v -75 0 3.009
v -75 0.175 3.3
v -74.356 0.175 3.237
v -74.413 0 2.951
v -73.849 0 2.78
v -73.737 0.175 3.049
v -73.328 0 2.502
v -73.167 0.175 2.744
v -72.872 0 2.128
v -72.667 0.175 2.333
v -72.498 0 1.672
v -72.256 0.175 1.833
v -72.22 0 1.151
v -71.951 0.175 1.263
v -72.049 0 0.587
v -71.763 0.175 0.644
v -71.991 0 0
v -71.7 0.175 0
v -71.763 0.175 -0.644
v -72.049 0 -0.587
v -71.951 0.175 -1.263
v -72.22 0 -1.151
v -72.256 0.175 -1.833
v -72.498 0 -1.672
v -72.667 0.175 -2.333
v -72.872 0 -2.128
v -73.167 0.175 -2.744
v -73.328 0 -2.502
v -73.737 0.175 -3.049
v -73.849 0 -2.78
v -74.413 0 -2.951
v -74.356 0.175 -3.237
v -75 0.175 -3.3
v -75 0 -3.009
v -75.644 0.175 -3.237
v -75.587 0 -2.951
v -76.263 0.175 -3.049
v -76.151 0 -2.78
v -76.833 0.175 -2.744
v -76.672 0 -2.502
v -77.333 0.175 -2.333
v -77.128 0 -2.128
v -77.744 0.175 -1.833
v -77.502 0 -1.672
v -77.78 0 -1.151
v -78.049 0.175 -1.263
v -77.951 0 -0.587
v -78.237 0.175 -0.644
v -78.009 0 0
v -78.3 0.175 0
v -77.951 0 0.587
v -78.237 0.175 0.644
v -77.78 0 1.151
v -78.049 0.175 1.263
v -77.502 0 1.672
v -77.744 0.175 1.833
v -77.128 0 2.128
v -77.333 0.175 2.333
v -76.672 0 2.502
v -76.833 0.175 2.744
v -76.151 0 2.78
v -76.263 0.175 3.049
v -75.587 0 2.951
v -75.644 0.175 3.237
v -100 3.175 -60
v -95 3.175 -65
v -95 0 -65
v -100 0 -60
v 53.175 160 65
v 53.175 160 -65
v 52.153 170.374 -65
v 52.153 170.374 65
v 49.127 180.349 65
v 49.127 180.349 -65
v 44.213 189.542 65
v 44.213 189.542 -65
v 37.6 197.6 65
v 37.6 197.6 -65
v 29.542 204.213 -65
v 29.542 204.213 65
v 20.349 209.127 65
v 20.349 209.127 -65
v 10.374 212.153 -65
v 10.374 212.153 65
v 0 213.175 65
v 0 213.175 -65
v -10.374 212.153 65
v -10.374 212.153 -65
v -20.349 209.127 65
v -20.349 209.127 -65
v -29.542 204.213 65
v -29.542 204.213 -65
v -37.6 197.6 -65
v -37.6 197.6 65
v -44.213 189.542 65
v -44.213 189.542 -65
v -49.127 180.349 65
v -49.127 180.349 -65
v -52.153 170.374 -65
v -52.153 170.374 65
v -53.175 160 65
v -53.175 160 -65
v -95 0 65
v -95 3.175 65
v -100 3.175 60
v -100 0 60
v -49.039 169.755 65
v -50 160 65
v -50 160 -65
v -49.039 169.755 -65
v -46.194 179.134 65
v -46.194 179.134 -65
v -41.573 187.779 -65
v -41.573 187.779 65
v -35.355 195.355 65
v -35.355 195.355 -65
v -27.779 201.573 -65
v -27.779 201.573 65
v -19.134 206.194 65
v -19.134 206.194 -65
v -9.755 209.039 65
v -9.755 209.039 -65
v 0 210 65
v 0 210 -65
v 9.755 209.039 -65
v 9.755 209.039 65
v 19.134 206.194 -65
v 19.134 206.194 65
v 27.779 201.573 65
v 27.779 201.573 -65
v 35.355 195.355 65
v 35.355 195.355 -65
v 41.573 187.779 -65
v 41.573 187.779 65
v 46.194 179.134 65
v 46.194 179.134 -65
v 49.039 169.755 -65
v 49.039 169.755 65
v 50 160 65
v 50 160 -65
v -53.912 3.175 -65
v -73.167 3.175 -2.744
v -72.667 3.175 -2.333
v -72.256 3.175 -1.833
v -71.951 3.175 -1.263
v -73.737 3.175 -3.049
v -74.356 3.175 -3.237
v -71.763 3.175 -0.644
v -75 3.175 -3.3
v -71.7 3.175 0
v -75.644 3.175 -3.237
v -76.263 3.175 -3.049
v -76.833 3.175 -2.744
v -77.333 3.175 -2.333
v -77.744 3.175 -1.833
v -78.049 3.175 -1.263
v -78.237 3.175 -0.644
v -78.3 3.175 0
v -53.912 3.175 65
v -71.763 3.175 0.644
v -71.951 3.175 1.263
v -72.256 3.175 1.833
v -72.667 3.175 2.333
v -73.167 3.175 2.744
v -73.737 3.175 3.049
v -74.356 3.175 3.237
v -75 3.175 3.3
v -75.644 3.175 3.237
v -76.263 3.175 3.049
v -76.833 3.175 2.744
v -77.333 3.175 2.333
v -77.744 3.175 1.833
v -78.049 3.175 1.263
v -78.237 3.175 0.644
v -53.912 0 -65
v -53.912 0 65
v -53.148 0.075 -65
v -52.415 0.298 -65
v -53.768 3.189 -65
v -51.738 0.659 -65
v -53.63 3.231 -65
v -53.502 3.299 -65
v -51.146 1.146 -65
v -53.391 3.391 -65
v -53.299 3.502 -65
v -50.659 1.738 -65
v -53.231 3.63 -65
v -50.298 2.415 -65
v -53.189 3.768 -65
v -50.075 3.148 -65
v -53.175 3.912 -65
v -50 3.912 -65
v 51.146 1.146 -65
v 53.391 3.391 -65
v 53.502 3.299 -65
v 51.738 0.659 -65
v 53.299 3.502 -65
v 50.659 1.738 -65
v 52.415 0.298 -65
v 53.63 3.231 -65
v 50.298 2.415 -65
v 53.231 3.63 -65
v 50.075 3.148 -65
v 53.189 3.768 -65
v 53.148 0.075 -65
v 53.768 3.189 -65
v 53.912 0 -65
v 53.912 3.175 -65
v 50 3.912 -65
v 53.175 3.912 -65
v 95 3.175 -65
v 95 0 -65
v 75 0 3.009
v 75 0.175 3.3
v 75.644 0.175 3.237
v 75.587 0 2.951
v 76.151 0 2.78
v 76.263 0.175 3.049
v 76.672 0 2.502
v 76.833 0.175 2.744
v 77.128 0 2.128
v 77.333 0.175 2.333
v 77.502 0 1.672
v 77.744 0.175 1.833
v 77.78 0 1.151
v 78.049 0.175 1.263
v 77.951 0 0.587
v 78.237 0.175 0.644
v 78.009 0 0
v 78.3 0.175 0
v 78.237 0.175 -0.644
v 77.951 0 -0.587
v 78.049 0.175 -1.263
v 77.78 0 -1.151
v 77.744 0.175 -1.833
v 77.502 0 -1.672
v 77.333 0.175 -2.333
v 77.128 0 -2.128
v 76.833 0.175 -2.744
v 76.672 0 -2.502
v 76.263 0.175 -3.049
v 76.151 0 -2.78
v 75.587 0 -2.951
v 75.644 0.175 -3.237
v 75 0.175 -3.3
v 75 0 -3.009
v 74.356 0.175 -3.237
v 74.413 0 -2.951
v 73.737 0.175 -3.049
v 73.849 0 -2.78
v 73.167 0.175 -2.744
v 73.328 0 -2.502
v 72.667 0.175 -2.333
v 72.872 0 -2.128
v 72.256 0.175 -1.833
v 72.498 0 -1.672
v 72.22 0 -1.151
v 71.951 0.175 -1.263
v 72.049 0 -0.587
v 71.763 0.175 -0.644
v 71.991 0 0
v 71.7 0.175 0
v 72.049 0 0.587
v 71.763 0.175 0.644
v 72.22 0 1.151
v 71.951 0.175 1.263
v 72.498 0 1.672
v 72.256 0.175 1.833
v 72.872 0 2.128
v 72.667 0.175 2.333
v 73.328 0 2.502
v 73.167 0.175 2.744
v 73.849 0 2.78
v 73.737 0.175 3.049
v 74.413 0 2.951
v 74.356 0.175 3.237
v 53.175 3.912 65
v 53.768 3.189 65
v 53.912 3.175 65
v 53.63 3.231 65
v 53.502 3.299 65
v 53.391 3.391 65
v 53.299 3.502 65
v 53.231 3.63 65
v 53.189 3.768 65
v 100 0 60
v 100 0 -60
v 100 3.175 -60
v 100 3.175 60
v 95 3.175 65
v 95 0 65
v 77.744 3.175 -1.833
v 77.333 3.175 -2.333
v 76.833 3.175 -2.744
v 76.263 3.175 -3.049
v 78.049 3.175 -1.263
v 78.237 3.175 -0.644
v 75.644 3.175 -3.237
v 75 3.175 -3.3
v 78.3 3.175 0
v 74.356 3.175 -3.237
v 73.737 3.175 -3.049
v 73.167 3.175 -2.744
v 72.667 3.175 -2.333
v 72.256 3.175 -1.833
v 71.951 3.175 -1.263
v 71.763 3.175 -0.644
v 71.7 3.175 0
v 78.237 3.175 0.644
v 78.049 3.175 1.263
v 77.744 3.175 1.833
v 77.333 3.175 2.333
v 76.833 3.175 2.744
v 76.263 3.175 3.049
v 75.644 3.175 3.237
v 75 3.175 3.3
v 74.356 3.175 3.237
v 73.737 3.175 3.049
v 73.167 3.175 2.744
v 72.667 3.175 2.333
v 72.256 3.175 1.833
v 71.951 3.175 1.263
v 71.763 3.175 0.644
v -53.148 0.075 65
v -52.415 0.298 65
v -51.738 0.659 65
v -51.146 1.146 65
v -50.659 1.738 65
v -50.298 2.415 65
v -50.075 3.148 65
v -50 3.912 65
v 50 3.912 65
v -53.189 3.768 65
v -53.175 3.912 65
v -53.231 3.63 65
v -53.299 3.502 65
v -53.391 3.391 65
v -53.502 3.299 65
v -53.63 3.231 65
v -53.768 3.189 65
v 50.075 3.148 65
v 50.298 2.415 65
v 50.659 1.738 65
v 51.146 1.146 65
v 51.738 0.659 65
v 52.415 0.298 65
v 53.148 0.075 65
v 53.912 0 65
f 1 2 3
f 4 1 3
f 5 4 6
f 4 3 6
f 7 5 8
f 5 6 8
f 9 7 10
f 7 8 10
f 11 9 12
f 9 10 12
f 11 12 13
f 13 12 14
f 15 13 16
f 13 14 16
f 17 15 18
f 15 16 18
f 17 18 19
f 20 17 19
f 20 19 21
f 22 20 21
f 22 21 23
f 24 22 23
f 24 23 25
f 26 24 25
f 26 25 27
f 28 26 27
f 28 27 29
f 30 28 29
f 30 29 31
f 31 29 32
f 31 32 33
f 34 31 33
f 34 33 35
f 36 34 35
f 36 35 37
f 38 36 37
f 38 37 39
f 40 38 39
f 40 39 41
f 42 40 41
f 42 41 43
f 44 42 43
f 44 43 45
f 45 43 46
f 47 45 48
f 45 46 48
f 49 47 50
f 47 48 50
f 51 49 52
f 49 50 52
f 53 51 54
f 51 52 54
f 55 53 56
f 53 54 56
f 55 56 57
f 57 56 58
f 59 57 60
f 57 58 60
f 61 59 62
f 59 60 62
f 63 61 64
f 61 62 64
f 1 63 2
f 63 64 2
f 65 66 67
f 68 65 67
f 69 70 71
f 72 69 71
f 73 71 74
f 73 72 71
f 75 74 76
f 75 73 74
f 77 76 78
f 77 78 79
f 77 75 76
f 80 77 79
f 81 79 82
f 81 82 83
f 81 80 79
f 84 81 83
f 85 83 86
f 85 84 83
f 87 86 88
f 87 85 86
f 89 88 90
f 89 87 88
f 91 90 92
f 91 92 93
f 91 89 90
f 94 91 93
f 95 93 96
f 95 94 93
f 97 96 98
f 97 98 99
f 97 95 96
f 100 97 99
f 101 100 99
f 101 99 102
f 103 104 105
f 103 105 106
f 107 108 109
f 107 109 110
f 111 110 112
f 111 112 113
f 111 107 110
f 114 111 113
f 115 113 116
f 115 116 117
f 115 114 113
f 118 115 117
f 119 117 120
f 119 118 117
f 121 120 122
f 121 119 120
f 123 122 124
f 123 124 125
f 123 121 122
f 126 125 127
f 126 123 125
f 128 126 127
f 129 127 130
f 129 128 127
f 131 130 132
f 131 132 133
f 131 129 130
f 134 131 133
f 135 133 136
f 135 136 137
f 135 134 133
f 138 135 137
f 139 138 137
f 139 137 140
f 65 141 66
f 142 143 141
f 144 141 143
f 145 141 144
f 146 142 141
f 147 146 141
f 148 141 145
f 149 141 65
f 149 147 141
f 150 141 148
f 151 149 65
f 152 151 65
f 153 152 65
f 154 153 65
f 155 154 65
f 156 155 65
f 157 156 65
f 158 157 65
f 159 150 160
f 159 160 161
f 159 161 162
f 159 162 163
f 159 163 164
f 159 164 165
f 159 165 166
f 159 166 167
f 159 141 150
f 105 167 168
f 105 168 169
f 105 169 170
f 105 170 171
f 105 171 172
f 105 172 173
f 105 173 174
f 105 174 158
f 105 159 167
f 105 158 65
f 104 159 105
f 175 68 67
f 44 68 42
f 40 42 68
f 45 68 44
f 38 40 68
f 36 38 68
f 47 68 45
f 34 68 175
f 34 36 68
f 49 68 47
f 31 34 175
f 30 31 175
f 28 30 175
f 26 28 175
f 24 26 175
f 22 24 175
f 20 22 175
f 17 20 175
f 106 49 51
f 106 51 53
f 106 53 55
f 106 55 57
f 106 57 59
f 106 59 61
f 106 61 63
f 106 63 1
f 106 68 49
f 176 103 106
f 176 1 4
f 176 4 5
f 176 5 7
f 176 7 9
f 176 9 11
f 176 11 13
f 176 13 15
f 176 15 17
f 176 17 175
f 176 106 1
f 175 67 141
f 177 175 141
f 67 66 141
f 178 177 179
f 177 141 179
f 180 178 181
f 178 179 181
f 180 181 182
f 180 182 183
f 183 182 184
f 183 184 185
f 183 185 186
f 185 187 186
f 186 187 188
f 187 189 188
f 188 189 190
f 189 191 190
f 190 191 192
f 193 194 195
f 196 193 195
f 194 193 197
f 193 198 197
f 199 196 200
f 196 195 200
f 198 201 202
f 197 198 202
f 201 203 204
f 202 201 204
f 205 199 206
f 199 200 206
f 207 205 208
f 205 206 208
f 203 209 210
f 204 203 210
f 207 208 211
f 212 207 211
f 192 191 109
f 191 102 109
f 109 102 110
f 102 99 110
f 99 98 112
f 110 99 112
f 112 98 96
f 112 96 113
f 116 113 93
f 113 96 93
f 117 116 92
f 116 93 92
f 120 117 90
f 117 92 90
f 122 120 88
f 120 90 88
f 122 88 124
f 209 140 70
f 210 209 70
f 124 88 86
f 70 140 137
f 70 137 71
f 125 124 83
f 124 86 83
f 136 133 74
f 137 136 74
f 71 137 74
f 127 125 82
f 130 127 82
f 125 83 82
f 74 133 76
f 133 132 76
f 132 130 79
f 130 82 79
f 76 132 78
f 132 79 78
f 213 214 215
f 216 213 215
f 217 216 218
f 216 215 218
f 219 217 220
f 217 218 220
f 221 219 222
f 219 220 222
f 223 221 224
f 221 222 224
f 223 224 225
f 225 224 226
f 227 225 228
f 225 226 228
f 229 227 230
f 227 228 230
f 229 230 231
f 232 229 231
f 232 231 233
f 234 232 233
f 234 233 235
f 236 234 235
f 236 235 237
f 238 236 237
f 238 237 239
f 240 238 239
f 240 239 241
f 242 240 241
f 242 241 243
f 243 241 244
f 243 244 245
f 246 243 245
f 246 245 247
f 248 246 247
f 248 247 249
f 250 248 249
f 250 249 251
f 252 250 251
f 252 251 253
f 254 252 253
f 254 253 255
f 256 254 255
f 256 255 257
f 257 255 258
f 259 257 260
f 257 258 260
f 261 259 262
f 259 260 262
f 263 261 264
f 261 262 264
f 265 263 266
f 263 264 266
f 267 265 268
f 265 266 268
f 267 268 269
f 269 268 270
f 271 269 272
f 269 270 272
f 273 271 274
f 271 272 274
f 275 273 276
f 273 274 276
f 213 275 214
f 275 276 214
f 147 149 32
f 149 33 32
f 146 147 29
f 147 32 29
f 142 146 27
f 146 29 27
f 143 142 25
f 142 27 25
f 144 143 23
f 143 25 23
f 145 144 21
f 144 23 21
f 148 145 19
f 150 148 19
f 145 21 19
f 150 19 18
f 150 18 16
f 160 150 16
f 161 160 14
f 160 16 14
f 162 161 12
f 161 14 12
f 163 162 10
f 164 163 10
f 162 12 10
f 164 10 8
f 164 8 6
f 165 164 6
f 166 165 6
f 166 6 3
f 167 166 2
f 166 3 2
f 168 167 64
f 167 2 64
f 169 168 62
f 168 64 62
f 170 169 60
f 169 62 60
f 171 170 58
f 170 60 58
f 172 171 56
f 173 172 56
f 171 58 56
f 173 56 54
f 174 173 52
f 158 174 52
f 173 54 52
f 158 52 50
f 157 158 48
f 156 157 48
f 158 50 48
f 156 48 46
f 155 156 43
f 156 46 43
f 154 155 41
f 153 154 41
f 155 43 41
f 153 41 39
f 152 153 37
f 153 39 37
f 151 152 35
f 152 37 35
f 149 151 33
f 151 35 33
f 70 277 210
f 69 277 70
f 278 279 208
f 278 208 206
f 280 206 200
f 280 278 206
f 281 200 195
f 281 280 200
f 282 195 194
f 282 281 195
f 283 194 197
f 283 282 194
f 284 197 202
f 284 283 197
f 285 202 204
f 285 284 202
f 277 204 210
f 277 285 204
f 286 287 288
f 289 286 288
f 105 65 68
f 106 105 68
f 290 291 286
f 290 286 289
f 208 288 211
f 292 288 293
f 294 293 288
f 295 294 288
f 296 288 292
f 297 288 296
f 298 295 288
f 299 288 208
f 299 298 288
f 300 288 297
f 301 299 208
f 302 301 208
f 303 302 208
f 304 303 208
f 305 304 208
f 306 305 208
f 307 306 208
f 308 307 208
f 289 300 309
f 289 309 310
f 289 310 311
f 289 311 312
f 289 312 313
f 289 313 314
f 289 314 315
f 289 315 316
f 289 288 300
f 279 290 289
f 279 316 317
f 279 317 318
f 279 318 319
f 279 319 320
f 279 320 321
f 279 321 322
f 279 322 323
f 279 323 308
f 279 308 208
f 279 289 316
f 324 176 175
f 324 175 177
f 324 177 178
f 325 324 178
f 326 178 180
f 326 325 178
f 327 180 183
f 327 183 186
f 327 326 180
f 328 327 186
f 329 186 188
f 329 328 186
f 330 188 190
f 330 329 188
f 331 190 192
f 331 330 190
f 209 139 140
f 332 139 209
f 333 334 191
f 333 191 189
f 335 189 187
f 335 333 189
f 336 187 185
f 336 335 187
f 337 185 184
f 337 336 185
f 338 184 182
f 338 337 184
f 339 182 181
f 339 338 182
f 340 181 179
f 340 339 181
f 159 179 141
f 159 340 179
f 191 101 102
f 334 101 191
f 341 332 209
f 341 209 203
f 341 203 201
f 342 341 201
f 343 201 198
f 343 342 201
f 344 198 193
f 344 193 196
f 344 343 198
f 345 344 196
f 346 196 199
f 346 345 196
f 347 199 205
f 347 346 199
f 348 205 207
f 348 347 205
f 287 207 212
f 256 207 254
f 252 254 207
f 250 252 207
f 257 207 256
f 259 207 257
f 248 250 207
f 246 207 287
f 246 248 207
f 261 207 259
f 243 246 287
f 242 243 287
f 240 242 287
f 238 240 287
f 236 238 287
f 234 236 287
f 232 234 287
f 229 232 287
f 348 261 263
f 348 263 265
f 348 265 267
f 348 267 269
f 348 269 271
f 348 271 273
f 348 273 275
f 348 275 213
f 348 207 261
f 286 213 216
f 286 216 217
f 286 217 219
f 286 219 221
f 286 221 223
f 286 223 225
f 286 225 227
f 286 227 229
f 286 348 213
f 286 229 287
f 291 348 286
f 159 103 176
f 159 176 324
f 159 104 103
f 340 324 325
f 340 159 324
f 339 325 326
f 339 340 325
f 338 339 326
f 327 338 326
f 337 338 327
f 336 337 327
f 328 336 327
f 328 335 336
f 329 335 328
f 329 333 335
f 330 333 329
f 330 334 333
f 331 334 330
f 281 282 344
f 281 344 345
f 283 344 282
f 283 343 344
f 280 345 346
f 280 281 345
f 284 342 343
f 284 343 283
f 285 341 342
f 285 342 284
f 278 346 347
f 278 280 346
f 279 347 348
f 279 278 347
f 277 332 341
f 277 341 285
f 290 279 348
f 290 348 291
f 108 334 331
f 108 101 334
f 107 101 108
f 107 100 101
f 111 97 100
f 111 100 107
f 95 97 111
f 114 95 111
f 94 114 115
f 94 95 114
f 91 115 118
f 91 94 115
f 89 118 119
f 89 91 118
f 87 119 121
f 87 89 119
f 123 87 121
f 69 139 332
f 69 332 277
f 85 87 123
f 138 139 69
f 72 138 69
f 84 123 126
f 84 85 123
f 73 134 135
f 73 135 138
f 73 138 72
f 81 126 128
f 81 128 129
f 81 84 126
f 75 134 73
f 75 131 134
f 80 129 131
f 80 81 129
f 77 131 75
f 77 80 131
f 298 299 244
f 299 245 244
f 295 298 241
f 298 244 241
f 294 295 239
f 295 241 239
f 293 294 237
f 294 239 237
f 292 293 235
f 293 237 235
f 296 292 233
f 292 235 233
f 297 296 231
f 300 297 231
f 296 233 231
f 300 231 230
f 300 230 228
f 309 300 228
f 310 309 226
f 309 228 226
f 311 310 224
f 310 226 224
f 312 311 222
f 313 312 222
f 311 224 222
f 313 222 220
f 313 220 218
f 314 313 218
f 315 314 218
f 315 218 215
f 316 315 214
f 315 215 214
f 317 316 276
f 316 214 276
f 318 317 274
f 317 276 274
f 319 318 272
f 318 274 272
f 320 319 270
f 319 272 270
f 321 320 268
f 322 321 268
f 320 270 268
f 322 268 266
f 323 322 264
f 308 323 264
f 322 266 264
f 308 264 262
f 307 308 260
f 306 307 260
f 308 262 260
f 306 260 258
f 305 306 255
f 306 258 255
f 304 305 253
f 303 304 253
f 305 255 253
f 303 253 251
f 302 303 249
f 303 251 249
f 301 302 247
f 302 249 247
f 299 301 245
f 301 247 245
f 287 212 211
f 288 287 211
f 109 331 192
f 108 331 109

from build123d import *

# Parameters (mm, degrees)
BASE_FLANGE1_DEPTH             = 65
CHAMFER1_SIZE                  = 5
F_6_6_6_6_DIAMETER_HOLE1_D     = 6.6
F_6_6_6_6_DIAMETER_HOLE1_DEPTH = 3
F_6_6_6_6_DIAMETER_HOLE1_TIP   = 1.982840043


# Sheet-metal steps are written as plain solids
with BuildPart() as part:
    # Sketch1 → Base-Flange1 (new, symmetric)
    with BuildSketch(Plane.XY):
        with BuildLine():
            Line((-100, 0), (-53.9116, 0))
            ThreePointArc((-53.9116, 0), (-51.145681115, 1.145681115), (-50, 3.9116))
            Line((-50, 3.9116), (-50, 160))
            ThreePointArc((-50, 160), (0, 210), (50, 160))
            Line((50, 160), (50, 3.9116))
            ThreePointArc((50, 3.9116), (51.145681115, 1.145681115), (53.9116, 0))
            Line((53.9116, 0), (100, 0))
            Line((100, 0), (100, 3.175))
            Line((100, 3.175), (53.9116, 3.175))
            ThreePointArc((53.9116, 3.175), (53.390745145, 3.390745145), (53.175, 3.9116))
            Line((53.175, 3.9116), (53.175, 160))
            ThreePointArc((53.175, 160), (0, 213.175), (-53.175, 160))
            Line((-53.175, 160), (-53.175, 3.9116))
            ThreePointArc((-53.175, 3.9116), (-53.390745145, 3.390745145), (-53.9116, 3.175))
            Line((-53.9116, 3.175), (-100, 3.175))
            Line((-100, 3.175), (-100, 0))
        make_face()
    extrude(amount=BASE_FLANGE1_DEPTH, both=True)

    # Chamfer1
    chamfer1_edges = [part.edges().sort_by_distance(p)[0] for p in [
        (-100, 1.5875, -65),
        (100, 1.5875, -65),
        (-100, 1.5875, 65),
        (100, 1.5875, 65),
    ]]
    chamfer(chamfer1_edges, length=CHAMFER1_SIZE)

    # Ø6.6 (6.6) Diameter Hole1
    with Locations(Plane(origin=(75, 3.175, 0), x_dir=(0, 0, 1), z_dir=(0, 1, 0))):
        with Locations((0, 0), (0, -150)):
            Hole(F_6_6_6_6_DIAMETER_HOLE1_D / 2, depth=F_6_6_6_6_DIAMETER_HOLE1_DEPTH)
            with Locations((0, 0, -(F_6_6_6_6_DIAMETER_HOLE1_DEPTH + F_6_6_6_6_DIAMETER_HOLE1_TIP / 2))):  # 118° drill point
                Cone(0, F_6_6_6_6_DIAMETER_HOLE1_D / 2, F_6_6_6_6_DIAMETER_HOLE1_TIP, mode=Mode.SUBTRACT)


solid = part.part
